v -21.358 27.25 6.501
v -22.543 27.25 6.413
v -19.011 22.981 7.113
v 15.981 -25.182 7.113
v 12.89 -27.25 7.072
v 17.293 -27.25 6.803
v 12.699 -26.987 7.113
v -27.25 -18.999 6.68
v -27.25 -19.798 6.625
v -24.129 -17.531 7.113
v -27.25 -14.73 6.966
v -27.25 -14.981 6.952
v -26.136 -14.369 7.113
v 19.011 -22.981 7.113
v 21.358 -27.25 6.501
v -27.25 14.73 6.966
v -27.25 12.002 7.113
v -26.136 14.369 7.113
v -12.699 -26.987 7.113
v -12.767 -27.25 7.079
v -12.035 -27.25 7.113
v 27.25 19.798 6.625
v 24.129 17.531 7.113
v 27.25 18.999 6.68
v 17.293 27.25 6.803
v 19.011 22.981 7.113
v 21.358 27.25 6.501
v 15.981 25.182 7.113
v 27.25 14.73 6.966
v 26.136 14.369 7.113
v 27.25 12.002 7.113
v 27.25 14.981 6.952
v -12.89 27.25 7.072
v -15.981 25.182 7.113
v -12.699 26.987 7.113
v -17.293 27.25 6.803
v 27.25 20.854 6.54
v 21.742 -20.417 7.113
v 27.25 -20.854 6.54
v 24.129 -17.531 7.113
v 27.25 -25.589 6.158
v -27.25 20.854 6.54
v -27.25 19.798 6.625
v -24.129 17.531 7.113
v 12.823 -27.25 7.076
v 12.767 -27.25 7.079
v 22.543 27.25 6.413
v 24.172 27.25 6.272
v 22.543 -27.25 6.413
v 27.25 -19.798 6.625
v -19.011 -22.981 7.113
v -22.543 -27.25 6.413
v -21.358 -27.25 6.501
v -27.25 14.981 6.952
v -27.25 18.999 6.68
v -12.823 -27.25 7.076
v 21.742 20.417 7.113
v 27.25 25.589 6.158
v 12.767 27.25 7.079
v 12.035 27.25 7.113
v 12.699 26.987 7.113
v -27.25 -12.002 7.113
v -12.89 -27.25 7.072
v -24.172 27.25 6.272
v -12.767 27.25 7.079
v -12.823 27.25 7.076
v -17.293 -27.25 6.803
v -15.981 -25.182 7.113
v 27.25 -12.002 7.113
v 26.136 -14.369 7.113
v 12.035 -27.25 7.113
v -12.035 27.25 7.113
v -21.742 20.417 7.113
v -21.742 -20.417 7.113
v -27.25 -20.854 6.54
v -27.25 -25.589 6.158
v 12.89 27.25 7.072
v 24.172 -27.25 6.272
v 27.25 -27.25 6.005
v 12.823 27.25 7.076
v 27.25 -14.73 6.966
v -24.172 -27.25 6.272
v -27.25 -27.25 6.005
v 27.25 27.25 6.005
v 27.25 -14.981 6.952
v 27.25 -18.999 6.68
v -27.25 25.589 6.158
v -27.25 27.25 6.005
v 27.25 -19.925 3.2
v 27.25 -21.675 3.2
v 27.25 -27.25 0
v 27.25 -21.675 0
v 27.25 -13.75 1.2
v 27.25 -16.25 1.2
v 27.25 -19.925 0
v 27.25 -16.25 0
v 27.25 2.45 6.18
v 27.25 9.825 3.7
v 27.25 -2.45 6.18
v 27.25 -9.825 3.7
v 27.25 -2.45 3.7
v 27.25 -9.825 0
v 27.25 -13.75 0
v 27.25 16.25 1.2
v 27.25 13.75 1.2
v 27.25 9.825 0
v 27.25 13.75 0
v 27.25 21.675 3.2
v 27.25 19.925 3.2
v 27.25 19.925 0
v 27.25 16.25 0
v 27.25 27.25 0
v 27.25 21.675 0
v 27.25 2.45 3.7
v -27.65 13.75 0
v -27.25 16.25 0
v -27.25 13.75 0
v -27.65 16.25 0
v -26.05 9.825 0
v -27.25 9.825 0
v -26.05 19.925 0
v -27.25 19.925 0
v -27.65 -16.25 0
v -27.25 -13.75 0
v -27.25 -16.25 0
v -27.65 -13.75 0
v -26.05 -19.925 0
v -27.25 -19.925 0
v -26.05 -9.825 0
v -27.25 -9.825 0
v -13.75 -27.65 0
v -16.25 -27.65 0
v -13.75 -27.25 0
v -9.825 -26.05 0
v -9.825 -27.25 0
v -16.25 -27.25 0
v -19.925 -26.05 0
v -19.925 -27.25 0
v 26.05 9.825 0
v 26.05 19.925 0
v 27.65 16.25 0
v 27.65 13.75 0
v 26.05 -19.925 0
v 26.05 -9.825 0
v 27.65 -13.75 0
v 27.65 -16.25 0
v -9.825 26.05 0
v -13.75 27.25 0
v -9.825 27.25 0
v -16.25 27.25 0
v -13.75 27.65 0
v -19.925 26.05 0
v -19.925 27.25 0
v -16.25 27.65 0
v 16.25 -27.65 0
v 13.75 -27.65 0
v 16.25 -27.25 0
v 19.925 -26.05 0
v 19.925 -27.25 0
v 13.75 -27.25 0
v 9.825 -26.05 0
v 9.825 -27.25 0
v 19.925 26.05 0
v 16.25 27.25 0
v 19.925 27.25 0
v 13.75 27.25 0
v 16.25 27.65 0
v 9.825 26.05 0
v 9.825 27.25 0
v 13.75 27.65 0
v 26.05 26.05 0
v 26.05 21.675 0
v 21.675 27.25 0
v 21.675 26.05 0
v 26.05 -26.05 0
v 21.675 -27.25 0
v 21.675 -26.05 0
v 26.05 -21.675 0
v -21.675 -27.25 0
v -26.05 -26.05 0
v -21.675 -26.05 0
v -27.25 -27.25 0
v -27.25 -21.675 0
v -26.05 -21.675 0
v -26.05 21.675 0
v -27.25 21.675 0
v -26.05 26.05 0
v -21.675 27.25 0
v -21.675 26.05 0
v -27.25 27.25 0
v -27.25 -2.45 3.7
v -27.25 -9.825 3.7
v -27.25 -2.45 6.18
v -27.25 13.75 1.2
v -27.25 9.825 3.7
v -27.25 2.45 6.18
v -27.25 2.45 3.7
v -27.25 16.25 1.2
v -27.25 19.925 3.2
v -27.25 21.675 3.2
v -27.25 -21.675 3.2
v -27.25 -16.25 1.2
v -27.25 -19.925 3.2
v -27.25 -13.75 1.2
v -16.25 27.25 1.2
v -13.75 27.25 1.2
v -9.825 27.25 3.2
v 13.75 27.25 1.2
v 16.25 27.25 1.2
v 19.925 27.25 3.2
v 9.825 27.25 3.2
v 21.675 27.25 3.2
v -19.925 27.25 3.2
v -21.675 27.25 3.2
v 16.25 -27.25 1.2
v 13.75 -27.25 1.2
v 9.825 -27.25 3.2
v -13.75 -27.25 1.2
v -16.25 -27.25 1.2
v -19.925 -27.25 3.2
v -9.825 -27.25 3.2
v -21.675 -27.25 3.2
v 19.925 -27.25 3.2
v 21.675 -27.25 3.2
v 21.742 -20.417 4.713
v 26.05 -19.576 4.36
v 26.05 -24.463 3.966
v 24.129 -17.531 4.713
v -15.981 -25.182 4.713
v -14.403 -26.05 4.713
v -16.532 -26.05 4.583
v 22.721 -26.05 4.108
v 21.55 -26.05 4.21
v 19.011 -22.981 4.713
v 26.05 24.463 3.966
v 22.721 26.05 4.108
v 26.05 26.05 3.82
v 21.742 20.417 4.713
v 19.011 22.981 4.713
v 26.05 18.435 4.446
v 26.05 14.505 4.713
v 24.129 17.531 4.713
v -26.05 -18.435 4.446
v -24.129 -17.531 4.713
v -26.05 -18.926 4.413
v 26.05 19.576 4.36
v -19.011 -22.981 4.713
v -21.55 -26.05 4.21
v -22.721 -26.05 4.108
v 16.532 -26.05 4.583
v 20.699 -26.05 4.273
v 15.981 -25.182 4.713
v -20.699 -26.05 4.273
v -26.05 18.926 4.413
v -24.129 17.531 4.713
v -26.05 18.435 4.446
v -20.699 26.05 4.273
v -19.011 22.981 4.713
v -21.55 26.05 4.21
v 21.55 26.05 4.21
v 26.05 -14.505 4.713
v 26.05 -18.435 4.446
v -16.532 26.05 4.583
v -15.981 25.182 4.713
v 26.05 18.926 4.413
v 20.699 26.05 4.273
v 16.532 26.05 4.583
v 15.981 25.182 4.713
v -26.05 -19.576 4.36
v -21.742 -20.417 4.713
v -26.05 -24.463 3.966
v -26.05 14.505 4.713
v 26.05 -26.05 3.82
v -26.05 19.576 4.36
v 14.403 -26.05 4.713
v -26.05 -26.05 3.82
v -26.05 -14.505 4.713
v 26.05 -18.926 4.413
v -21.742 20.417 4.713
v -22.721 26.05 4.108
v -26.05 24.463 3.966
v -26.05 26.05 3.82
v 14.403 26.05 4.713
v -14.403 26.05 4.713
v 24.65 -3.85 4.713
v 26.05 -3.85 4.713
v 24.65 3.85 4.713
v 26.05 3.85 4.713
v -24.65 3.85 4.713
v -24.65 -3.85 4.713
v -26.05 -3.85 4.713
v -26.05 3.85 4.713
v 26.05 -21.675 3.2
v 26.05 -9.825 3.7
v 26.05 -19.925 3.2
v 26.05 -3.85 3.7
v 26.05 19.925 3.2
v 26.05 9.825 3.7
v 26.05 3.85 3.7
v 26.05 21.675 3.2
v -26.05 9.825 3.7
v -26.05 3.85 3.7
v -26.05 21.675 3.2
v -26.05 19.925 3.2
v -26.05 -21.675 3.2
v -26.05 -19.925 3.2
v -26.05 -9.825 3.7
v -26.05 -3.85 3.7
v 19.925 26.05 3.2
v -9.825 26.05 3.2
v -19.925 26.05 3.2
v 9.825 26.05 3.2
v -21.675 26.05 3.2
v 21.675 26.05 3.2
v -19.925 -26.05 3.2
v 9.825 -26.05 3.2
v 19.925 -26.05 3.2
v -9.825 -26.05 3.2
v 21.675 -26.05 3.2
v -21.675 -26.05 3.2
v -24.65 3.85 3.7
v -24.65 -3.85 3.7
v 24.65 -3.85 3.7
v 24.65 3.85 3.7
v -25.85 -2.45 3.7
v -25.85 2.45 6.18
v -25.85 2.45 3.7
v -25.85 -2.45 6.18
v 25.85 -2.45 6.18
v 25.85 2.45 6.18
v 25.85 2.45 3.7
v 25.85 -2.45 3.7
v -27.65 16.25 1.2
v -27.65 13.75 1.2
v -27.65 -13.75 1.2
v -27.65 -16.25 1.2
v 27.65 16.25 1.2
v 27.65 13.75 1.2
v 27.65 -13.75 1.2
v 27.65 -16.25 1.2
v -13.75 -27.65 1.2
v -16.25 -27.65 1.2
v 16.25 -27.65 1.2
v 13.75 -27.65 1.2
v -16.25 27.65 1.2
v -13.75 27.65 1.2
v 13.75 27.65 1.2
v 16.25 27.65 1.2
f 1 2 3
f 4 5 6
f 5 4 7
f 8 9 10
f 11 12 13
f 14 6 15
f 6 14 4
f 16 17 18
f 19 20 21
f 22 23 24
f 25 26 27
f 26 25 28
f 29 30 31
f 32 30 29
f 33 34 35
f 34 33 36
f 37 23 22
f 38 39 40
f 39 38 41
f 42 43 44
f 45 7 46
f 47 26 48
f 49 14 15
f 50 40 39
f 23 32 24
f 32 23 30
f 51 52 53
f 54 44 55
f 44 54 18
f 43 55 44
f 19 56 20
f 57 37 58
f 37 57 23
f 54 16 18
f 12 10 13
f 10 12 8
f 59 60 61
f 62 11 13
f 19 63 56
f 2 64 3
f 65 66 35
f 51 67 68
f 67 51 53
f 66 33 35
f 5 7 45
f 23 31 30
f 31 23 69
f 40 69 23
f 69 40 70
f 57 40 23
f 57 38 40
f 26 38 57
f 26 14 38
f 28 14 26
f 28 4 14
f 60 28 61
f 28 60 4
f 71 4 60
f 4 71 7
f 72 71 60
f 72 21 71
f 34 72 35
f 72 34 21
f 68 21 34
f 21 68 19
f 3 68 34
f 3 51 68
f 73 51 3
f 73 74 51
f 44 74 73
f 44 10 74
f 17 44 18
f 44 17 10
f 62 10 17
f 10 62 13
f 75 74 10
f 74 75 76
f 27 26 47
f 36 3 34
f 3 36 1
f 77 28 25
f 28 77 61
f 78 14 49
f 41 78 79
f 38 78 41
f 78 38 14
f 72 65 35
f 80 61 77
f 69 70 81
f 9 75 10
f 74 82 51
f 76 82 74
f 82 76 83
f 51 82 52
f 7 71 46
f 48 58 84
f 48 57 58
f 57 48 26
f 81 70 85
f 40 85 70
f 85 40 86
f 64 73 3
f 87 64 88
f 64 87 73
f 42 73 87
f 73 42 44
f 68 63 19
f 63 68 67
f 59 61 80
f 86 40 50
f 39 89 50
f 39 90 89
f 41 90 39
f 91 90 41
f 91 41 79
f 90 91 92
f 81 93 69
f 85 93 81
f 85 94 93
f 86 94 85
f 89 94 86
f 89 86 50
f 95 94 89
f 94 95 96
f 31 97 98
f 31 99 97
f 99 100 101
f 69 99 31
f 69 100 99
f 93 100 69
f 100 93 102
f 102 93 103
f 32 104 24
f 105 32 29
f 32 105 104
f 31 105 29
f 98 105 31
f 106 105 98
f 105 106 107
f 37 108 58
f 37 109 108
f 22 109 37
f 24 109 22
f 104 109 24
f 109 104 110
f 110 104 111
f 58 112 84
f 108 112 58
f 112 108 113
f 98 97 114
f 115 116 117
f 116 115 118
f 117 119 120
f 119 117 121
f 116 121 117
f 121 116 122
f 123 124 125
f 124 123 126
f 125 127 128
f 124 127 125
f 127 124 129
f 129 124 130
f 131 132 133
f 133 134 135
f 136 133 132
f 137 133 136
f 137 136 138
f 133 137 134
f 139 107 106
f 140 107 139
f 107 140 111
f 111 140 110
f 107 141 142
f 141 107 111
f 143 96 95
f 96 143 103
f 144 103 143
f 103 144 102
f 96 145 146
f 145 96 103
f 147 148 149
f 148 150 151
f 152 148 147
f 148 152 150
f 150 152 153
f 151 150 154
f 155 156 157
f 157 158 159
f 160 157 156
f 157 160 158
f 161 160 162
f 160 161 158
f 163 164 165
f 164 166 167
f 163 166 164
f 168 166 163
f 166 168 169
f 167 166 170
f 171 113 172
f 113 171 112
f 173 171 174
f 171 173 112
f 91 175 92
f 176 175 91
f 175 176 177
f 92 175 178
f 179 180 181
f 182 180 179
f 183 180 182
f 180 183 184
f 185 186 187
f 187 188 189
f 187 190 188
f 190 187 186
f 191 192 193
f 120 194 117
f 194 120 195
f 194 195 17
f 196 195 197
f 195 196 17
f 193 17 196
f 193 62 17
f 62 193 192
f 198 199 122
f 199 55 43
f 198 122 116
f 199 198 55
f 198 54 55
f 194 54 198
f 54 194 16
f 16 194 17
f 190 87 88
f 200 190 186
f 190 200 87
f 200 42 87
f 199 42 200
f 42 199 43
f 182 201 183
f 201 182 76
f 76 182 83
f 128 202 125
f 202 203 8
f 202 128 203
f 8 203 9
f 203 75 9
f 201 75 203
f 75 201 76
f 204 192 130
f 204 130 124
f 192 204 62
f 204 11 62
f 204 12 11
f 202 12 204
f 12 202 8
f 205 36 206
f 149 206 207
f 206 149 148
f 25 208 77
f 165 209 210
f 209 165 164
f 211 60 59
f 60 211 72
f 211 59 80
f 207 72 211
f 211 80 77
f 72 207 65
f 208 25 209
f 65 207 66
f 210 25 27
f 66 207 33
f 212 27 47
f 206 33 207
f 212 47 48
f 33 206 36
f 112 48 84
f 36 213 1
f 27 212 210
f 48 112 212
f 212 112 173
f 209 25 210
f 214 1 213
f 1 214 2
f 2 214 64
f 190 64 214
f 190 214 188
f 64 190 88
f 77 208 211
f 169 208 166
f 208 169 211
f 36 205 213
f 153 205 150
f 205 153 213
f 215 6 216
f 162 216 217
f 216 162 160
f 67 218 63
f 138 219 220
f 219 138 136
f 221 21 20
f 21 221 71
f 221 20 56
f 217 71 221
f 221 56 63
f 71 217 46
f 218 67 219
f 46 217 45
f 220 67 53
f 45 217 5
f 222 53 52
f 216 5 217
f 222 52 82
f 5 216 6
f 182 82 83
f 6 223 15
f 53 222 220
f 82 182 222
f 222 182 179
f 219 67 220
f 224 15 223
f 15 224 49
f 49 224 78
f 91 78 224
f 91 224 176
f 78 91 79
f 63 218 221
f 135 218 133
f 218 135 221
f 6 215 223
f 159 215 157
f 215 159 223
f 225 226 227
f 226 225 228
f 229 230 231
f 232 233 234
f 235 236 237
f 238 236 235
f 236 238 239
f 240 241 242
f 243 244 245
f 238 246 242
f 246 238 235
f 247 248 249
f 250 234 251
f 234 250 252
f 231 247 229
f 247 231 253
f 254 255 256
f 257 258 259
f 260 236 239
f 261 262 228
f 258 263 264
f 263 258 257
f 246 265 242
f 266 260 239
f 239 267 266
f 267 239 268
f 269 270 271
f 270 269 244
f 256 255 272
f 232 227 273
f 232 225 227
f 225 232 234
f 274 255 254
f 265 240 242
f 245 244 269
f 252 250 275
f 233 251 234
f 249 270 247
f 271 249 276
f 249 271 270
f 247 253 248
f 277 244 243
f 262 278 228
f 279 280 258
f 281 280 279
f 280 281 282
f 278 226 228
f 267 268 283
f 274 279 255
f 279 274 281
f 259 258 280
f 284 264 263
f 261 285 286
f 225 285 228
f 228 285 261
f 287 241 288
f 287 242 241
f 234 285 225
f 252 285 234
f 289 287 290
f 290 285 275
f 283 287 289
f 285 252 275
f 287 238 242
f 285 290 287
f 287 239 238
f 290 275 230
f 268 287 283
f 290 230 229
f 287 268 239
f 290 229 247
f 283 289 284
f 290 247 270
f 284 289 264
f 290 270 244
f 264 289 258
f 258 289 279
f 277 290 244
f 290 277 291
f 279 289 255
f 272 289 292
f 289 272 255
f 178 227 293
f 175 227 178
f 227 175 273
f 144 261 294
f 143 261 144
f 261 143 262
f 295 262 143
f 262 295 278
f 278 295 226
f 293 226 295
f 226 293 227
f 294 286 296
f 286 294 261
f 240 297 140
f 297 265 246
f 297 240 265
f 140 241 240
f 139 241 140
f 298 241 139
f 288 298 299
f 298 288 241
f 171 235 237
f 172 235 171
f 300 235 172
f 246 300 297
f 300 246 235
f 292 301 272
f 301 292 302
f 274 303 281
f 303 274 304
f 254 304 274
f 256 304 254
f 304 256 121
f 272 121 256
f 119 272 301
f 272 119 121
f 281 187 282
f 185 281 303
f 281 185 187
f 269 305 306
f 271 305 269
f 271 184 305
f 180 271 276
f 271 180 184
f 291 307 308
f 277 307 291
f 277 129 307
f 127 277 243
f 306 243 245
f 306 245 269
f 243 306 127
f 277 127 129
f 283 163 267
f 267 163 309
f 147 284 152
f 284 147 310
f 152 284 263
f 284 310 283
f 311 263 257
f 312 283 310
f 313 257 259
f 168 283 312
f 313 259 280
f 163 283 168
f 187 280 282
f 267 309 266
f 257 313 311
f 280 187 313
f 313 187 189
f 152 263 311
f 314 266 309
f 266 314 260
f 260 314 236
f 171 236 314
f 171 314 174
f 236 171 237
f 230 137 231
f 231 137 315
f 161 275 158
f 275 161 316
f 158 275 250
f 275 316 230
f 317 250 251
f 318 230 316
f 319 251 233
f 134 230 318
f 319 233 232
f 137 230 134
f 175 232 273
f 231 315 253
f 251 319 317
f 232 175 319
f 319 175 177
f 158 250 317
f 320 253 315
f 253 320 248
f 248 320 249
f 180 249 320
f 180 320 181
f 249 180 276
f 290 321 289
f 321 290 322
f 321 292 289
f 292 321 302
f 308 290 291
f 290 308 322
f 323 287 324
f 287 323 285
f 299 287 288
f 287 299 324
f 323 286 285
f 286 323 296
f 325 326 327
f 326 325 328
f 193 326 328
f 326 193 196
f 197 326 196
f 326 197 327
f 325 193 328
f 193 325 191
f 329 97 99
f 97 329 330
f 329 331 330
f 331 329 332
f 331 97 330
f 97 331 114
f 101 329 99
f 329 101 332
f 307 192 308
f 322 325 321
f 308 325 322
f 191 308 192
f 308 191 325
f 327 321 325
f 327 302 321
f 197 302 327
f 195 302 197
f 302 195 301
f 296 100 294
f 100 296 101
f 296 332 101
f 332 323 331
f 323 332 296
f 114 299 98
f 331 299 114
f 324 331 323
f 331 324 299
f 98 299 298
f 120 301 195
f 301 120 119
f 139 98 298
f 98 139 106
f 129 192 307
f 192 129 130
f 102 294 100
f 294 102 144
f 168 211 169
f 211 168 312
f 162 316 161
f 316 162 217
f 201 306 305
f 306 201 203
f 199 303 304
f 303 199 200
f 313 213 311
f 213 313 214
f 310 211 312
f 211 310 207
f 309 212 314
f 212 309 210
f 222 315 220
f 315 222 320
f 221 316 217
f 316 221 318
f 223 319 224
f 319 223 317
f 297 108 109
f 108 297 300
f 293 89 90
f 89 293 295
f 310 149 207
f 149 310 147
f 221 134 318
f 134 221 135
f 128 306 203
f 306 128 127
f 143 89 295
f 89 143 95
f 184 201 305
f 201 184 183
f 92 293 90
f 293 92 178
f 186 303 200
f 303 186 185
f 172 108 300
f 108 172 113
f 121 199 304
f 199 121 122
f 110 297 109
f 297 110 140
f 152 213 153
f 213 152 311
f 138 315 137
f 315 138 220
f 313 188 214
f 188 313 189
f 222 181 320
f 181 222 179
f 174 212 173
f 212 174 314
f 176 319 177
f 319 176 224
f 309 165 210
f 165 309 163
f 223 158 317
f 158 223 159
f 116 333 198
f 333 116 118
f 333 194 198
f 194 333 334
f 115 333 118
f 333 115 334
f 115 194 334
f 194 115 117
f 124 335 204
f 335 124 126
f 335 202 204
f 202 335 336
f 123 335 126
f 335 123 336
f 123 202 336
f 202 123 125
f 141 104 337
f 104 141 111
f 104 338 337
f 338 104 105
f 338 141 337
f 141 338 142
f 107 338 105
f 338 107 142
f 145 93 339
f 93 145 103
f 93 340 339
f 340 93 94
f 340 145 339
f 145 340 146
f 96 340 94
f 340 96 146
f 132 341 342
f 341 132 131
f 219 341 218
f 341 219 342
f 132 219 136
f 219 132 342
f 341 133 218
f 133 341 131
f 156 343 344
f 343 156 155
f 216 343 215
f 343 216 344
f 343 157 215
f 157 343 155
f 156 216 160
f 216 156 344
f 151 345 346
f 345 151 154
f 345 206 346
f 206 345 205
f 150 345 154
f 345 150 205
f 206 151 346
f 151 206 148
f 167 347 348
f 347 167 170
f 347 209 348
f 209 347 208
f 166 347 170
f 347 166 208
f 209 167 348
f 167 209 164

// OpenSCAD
wymiarZewX = 54.5;
wymiarZewY = 54.5;
wymiarZewZ = 9.5; // czubek kuli
wymiarPomZ = 6.2; // "kant" kuli
wymiarWewX = 51.7;
wymiarWewY = 51.7;
gruboscScianki = 2.4;
gruboscPizdryka = 1.25;
dlugoscPizdryka = 7.7;
offsetPidryka = 4.6;
sphereRadius = 475;

//$fn=256;
$fn=50;

     

zaslepka();

module roundedPanel()
{
    difference()
    {
        spherePosZ = -sphereRadius + wymiarZewZ - wymiarPomZ;
        
        intersection()
        {
            translate([0,0,spherePosZ])
            {
                sphere(r = sphereRadius);
            }
            cube(size = [wymiarZewX,wymiarZewY,wymiarZewZ], center = true);
        }

        intersection()
        {
            translate([0,0,spherePosZ - gruboscScianki])
            {
                sphere(r = sphereRadius);
            }
            translate([0,0,-gruboscScianki])
            {
                cube(size = [wymiarZewX - gruboscScianki,wymiarZewY - gruboscScianki,wymiarZewZ], center = true);
            }
        }
    }
}

module zaslepka()
{
    wnekaSzerokoscDuza = 19.65;
    wnekaSzerokoscMala = 1.75;
    wnekaWysokoscA = 3.70; // wneka B (pod zaczep) x 2
    wnekaWysokoscB = 3.20; // wneka A x 2 
    wnekaWysokoscC = wnekaWysokoscB; // mini wneka x 8
    
    boxMiniOuterX = 2.6;
    boxMiniOuterY = 7.7;
    boxMiniOuterZ = 4.0;
    boxMiniInnerX = 1.4;
    boxMiniInnerY = 4.9;
    boxMiniInnerZ = 3.18;
    
    offsetWnekaMini = 20.8;
    offsetWypustMini = 15.0;
    
    union()
    {
        difference()
        {
            difference()
            {
                union ()
                {
                    //baza
                    translate([0,0,wymiarZewZ/2])
                    {
                        roundedPanel();
                    }
                    //bloczki zew
                    translate([-wymiarZewX/2,-boxMiniOuterY/2,boxMiniOuterZ/2])
                    {
                        cube(size = [boxMiniOuterX, boxMiniOuterY,5.0], center = false);
                    }
                    translate([wymiarZewX/2 - boxMiniOuterX,-boxMiniOuterY/2,boxMiniOuterZ/2])
                    {
                        cube(size = [boxMiniOuterX, boxMiniOuterY,5.0], center = false);
                    }
                }
                union()
                {
                    // bloczki wew
                    translate([-wymiarZewX/2,-boxMiniInnerY/2,boxMiniOuterZ - 1])
                    {
                        cube(size = [boxMiniInnerX, boxMiniInnerY,boxMiniInnerZ], center = false);
                    }
                    translate([wymiarZewX/2 - boxMiniInnerX, -boxMiniInnerY/2,boxMiniOuterZ - 1])
                    {
                        cube(size = [boxMiniInnerX, boxMiniInnerY,boxMiniInnerZ], center = false);
                    }
                }
            }
            union ()
            {
                // wycinki szerokie
                translate([0,0,wnekaWysokoscA/2])
                {
                   cube(size = [wymiarZewX + 10, wnekaSzerokoscDuza, wnekaWysokoscA], center = true);
                }
                translate([0,0,wnekaWysokoscB/2])
                {
                    cube(size = [wnekaSzerokoscDuza, wymiarZewY + 10, wnekaWysokoscB], center = true);
                }
                // wycinki wąskie
                translate([0,-offsetWnekaMini,wnekaWysokoscC/2])
                {
                   cube(size = [wymiarZewX + 10, wnekaSzerokoscMala, wnekaWysokoscC], center = true);
                }
                translate([0,offsetWnekaMini,wnekaWysokoscC/2])
                {
                   cube(size = [wymiarZewX + 10, wnekaSzerokoscMala, wnekaWysokoscC], center = true);
                }
                translate([-offsetWnekaMini,0,wnekaWysokoscC/2])
                {
                   cube(size = [wnekaSzerokoscMala, wymiarZewY + 10, wnekaWysokoscC], center = true);
                }
                translate([offsetWnekaMini,0,wnekaWysokoscC/2])
                {
                   cube(size = [wnekaSzerokoscMala, wymiarZewY + 10, wnekaWysokoscC], center = true);
                }
            }
        }
       /*
          //Lid clips
          translate([-wymiarZewX / 2 + (1.5 * gruboscScianki), offsetPidryka, dlugoscPizdryka - (0.5 * gruboscScianki)])
              rotate([0, 180, 90]) clip(clipWidth = gruboscPizdryka, clipHeight = dlugoscPizdryka);
          translate([wymiarZewX / 2 - (1.5 * gruboscScianki), -offsetPidryka, dlugoscPizdryka - (0.5 *  gruboscScianki)])
              rotate([0, 180, 270]) clip(clipWidth = gruboscPizdryka, clipHeight = dlugoscPizdryka);
          translate([-wymiarZewX / 2 + (1.5 * gruboscScianki), -offsetPidryka, dlugoscPizdryka - (0.5 *  gruboscScianki)])
              rotate([0, 180, 90]) clip(clipWidth = gruboscPizdryka, clipHeight = dlugoscPizdryka);
          translate([wymiarZewX / 2 - (1.5 * gruboscScianki), offsetPidryka, dlugoscPizdryka - (0.5 *  gruboscScianki)])
              rotate([0, 180, 270]) clip(clipWidth = gruboscPizdryka, clipHeight = dlugoscPizdryka);*/
        
        // mikro pizdryki
          translate([-wymiarZewX / 2, offsetWypustMini, 0.6])
              rotate([0, 180, 90]) cube (size = [2.5, 0.8, 1.2], center = true);
          translate([-wymiarZewX / 2, -offsetWypustMini, 0.6])
              rotate([0, 180, 90]) cube (size = [2.5, 0.8, 1.2], center = true);
          translate([wymiarZewX / 2, offsetWypustMini, 0.6])
              rotate([0, 180, 90]) cube (size = [2.5, 0.8, 1.2], center = true);
          translate([wymiarZewX / 2, -offsetWypustMini, 0.6])
              rotate([0, 180, 90]) cube (size = [2.5, 0.8, 1.2], center = true);
          translate([-offsetWypustMini, -wymiarZewY / 2, 0.6])
              rotate([0, 180, 270]) cube (size = [0.8, 2.5, 1.2], center = true);
          translate([offsetWypustMini, -wymiarZewY / 2, 0.6])
              rotate([0, 180, 270]) cube (size = [0.8, 2.5, 1.2], center = true);
          translate([-offsetWypustMini, wymiarZewY / 2, 0.6])
              rotate([0, 180, 270]) cube (size = [0.8, 2.5, 1.2], center = true);
          translate([offsetWypustMini, wymiarZewY / 2, 0.6])
              rotate([0, 180, 270]) cube (size = [0.8, 2.5, 1.2], center = true);
    }
}


//Create a clip that snapps into a clipHole
module clip(clipWidth = 5, clipDepth = 5, clipHeight = 5, lipDepth = 1.5, lipHeight = 2.4)
{
  translate([-clipWidth/2, -(clipDepth-lipDepth), 0]) rotate([90, 0, 90])
  linear_extrude(height = clipWidth, convexity = 10)
    polygon(  points=[  [0, 0], 
            [clipDepth - lipDepth, 0],
            [clipDepth - lipDepth, clipHeight - lipHeight],
            [clipDepth - 0.25, clipHeight - lipHeight],
            [clipDepth, clipHeight - lipHeight + 0.25],
            [clipDepth - lipDepth * 0.8, clipHeight],
            [(clipDepth - lipDepth) * 0.3, clipHeight] 
            ], 
        paths=[[0,1,2,3,4,5,6,7]]
      );
}
